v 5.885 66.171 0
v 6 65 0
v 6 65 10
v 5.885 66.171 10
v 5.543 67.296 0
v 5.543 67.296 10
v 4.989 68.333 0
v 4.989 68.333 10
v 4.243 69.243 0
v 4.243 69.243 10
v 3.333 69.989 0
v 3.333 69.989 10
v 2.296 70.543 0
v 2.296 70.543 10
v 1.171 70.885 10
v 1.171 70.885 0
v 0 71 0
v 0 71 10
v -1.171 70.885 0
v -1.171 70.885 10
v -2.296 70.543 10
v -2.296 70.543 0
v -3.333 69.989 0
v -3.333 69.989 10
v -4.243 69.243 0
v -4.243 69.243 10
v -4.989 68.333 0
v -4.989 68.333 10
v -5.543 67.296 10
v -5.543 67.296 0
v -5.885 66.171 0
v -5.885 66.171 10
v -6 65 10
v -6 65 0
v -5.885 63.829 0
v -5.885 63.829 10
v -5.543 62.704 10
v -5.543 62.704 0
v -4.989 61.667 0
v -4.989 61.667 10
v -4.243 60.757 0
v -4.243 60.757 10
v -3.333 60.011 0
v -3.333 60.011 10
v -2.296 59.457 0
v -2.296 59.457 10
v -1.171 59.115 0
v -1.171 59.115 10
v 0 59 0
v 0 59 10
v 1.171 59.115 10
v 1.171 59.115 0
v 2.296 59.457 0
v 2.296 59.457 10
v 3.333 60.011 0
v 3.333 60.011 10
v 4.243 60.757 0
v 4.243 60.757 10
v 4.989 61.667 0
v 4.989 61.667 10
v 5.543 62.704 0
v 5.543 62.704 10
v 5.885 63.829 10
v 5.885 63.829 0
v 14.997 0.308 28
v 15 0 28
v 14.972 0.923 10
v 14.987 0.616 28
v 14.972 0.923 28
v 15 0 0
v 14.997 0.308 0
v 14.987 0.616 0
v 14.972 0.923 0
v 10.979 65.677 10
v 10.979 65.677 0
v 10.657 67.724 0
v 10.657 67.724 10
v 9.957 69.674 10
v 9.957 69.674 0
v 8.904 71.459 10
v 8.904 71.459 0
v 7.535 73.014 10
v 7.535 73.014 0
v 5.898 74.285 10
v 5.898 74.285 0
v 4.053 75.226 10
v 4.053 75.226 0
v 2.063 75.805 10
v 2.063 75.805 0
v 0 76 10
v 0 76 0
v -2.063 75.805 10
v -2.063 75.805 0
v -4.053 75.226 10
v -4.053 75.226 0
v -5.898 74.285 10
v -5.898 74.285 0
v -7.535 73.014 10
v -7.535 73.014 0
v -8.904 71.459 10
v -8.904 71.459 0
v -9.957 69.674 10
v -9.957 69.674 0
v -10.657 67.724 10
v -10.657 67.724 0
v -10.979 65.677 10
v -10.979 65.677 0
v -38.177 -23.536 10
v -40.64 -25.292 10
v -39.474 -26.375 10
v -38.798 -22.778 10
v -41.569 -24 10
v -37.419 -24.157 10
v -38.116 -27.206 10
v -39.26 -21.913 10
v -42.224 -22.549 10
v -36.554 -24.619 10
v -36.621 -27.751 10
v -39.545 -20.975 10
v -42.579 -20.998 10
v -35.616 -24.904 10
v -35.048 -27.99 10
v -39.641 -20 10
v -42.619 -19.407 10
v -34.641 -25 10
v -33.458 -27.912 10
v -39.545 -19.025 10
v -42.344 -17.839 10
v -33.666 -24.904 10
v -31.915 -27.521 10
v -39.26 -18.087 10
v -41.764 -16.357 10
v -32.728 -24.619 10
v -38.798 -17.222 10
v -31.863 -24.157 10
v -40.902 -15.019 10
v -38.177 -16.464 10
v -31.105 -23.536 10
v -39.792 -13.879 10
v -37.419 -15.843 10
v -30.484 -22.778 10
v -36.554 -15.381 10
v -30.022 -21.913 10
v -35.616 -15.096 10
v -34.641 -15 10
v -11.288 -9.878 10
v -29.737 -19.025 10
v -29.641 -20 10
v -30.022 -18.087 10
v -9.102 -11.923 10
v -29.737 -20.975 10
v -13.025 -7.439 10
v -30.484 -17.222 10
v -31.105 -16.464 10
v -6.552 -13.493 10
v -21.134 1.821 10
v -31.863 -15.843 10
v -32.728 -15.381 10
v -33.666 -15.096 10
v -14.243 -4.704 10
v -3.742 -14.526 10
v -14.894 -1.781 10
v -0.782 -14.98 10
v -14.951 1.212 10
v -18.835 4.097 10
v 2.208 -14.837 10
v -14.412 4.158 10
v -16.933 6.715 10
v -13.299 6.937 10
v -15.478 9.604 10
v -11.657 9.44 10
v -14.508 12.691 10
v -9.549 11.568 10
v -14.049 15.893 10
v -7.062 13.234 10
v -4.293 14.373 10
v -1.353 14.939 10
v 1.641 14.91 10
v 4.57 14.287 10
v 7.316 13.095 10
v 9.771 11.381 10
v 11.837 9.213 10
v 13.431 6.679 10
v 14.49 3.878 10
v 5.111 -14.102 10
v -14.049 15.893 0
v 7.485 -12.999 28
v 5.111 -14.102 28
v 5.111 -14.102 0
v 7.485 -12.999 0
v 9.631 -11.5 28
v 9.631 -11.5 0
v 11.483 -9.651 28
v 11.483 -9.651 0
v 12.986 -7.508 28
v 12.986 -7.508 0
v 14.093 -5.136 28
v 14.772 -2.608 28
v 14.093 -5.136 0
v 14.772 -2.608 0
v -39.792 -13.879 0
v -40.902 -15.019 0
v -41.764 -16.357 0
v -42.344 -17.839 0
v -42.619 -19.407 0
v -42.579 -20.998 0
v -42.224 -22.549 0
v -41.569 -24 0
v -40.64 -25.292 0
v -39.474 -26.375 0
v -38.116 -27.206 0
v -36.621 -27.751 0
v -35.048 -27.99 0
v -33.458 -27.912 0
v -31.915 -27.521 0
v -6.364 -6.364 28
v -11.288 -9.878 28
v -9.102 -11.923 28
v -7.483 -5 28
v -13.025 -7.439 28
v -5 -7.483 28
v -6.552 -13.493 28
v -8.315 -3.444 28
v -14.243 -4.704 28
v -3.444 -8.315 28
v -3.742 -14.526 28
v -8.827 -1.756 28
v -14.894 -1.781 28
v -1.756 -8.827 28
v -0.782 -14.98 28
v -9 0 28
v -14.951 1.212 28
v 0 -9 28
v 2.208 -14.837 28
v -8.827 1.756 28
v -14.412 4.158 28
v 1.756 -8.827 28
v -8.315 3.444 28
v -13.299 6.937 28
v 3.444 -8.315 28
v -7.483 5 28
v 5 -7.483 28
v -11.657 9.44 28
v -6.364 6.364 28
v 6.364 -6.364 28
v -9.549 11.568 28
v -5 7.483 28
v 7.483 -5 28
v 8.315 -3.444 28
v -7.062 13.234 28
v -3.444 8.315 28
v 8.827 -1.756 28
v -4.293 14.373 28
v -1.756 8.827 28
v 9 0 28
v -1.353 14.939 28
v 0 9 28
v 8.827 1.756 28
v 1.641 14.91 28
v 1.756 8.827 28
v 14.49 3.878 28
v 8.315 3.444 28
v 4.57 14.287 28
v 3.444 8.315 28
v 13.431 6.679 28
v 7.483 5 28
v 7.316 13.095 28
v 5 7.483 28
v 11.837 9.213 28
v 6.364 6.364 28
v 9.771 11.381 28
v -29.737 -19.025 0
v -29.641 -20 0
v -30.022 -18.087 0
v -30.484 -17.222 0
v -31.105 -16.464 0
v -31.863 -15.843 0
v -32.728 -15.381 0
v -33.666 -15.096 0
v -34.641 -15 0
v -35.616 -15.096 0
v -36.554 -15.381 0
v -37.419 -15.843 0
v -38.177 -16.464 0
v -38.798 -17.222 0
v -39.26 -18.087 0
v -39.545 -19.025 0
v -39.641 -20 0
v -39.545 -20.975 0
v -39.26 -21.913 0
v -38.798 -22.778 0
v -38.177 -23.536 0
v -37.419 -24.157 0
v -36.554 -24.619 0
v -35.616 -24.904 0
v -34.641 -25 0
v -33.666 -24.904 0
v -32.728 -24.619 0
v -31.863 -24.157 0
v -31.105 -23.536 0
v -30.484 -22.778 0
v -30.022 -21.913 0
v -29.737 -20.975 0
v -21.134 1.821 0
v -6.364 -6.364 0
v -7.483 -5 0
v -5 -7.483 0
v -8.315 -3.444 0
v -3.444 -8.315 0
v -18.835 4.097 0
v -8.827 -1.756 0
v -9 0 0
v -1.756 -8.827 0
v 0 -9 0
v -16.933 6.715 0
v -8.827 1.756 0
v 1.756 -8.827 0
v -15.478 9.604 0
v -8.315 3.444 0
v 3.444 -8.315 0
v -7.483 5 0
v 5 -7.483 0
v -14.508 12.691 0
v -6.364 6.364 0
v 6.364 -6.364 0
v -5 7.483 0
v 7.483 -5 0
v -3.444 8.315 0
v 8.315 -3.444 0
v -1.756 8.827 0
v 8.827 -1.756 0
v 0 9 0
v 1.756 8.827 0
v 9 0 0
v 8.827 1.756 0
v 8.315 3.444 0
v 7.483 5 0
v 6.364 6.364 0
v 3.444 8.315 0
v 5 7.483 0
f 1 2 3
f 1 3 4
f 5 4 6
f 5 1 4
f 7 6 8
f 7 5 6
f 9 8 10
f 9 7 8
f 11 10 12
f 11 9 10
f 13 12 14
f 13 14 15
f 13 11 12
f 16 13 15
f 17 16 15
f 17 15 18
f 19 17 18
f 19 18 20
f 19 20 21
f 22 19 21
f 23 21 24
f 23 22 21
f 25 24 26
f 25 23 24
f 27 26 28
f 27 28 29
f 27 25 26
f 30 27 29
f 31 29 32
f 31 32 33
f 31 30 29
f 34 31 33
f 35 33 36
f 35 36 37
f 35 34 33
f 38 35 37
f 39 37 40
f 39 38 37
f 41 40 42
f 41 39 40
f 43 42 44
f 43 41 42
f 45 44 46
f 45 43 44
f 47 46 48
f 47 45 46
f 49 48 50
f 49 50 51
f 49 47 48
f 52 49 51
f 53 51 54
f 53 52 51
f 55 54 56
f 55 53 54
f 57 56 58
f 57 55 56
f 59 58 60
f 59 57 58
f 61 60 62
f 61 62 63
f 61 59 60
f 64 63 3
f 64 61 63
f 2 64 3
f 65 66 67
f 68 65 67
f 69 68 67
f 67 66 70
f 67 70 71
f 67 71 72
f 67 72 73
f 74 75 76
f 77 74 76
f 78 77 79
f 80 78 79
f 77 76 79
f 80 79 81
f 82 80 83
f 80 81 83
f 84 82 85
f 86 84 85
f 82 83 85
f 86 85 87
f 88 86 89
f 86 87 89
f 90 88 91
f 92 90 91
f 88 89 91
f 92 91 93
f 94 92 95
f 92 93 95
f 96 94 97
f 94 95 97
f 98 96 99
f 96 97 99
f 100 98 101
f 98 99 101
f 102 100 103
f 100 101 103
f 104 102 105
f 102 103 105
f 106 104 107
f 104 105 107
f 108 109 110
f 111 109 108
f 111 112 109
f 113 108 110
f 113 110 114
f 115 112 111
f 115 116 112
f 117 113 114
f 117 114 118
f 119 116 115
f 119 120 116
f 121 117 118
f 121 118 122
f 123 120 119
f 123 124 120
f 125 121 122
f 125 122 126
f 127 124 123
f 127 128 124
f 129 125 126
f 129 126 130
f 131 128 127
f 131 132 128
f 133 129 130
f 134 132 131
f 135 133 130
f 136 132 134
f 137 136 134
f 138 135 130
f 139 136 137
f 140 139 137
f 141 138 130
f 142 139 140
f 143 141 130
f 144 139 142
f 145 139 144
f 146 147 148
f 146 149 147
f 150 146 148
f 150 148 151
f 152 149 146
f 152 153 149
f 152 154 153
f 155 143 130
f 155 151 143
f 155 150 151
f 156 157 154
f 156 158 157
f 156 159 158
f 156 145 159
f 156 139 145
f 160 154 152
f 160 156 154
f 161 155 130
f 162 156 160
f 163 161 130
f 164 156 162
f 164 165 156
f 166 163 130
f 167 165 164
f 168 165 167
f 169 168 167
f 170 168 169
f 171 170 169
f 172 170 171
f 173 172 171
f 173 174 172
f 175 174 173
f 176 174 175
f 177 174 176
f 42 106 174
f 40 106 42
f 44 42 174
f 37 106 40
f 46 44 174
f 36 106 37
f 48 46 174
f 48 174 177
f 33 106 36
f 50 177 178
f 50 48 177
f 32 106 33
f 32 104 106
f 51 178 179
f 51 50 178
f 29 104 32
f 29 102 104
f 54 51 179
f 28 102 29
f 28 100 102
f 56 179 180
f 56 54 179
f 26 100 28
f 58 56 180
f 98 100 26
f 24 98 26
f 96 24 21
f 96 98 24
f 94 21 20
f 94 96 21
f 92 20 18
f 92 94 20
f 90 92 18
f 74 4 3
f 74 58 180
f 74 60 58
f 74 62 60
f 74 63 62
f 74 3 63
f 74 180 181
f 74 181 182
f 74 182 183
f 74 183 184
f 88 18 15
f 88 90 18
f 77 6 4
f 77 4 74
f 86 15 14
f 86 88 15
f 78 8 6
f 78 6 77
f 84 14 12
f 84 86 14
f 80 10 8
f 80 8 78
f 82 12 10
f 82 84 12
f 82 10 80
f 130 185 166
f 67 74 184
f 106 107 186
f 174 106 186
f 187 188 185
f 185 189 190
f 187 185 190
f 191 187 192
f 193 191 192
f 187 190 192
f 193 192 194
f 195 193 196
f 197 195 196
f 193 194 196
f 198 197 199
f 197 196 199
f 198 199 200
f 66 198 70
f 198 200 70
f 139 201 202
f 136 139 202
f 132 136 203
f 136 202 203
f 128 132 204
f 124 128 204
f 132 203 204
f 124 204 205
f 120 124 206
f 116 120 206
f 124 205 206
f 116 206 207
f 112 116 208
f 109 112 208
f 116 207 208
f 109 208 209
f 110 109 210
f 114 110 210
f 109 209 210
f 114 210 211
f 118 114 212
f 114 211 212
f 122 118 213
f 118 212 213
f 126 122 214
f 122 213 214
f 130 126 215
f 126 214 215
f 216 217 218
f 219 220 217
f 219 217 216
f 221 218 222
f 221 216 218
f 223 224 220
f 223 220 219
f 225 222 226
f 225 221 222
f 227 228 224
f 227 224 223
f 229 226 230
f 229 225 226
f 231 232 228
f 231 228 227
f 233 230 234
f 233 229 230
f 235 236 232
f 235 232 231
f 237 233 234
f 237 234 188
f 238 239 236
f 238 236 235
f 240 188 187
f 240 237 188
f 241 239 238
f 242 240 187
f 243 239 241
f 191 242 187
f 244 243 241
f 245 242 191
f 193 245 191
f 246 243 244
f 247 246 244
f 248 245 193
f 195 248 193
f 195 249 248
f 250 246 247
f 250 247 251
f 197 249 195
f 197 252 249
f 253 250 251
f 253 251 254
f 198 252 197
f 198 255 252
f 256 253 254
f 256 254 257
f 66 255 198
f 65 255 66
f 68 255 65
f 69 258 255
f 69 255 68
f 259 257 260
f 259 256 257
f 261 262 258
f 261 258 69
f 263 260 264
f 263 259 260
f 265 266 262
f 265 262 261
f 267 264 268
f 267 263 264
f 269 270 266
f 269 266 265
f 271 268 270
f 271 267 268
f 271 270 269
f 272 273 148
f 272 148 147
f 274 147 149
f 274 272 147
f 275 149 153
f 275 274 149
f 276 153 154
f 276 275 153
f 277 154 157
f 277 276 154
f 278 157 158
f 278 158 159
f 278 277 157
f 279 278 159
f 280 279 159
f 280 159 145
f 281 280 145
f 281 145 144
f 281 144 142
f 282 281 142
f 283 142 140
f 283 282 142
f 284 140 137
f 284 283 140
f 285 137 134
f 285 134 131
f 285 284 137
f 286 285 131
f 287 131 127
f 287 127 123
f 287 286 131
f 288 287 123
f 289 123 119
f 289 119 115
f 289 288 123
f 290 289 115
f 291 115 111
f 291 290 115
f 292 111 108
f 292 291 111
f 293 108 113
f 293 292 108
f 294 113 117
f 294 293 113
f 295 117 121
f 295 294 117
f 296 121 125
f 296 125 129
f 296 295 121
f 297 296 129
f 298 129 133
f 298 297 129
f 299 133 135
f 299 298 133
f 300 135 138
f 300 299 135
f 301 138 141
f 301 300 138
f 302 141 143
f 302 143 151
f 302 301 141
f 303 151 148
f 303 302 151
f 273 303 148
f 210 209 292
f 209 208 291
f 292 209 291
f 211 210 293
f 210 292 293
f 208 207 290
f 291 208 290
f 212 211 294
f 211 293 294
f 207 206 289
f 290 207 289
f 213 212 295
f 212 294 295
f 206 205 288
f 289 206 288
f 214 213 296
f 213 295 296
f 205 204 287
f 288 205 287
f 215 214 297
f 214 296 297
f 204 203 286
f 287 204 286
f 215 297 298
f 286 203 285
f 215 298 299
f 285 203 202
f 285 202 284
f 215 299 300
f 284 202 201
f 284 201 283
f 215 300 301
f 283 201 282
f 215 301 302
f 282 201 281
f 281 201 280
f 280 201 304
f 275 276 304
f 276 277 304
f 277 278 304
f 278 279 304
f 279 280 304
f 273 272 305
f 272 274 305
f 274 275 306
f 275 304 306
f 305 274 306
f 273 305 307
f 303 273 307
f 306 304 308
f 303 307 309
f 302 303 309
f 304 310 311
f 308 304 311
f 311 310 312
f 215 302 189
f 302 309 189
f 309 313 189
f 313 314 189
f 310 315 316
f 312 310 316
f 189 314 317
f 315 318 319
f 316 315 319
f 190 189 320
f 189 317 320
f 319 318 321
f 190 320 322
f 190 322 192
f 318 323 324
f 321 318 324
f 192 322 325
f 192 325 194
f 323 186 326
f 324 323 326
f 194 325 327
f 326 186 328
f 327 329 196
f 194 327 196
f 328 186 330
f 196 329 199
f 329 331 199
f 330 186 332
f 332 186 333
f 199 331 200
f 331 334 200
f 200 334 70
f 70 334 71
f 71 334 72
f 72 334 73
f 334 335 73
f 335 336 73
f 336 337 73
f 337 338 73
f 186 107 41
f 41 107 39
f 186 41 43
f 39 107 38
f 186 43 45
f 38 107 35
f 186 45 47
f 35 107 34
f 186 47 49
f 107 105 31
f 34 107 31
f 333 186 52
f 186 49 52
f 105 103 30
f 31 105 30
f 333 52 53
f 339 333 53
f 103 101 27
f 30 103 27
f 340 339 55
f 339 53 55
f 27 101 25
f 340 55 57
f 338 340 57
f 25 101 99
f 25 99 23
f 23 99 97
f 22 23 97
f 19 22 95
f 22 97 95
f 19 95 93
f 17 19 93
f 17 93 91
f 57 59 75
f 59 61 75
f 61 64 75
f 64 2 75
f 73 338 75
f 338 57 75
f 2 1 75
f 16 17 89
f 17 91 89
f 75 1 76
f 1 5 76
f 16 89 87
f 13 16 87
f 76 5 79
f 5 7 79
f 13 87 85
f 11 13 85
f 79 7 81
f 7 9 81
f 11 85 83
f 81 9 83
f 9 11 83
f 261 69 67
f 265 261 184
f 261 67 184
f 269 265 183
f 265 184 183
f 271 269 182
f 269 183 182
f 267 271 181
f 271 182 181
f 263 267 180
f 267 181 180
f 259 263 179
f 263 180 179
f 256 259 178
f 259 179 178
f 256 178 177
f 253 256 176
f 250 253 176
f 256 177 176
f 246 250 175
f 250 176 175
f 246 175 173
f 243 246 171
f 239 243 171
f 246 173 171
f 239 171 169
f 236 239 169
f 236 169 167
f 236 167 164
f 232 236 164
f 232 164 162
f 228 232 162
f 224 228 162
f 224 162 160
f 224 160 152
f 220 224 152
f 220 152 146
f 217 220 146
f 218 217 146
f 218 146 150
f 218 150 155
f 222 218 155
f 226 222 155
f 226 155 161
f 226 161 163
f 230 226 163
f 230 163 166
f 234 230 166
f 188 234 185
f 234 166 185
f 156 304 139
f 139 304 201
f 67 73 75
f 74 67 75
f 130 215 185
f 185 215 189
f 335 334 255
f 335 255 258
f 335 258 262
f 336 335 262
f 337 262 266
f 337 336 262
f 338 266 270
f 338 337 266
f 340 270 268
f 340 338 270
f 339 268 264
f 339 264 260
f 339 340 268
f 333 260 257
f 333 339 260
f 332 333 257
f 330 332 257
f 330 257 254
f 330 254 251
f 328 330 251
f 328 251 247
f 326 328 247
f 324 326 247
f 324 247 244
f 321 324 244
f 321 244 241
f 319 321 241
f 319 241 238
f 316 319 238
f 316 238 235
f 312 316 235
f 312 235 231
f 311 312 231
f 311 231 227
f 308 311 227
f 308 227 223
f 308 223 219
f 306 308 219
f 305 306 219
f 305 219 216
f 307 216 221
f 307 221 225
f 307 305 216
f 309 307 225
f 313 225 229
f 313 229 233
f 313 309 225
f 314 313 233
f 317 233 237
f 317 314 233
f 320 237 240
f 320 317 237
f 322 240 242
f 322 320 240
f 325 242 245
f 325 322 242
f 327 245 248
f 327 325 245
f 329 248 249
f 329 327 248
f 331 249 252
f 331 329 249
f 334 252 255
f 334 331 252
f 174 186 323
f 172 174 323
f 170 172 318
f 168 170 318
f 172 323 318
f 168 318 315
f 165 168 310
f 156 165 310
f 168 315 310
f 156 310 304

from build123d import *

# Parameters (mm, degrees)
F0_R     = 9
F1_DEPTH = 28
F0_R_2   = 5
F0_R_3   = 6
F2_DEPTH = 10


with BuildPart() as f1:
    # F0 (on Top) → F1 (new body)
    with BuildSketch(Plane.XY):
        with BuildLine():
            ThreePointArc((5.110947, -14.102419), (12.281372, -8.612079), (15, 0))
            ThreePointArc((15, 0), (14.992891, 0.461757), (14.971571, 0.923077))
            ThreePointArc((14.971571, 0.923077), (-12.540664, 8.22993), (5.110947, -14.102419))
        make_face()
        Circle(F0_R, mode=Mode.SUBTRACT)
    extrude(amount=F1_DEPTH)

    # F0 (on Top) → F2 (join)
    with BuildSketch(Plane.XY):
        with BuildLine():
            ThreePointArc((5.110947, -14.102419), (12.281372, -8.612079), (15, 0))
            ThreePointArc((15, 0), (14.992891, 0.461757), (14.971571, 0.923077))
            ThreePointArc((14.971571, 0.923077), (-12.540664, 8.22993), (5.110947, -14.102419))
        make_face()
        Circle(F0_R, mode=Mode.SUBTRACT)
        with BuildLine():
            ThreePointArc((5.110947, -14.102419), (-12.540664, 8.22993), (14.971571, 0.923077))
            Line((14.971571, 0.923077), (10.979152, 65.676923))
            ThreePointArc((10.979152, 65.676923), (0, 76), (-10.979152, 65.676923))
            Line((-10.979152, 65.676923), (-14.048582, 15.893218))
            ThreePointArc((-14.048582, 15.893218), (-16.147129, 8.129895), (-21.133903, 1.820762))
            Line((-21.133903, 1.820762), (-39.791725, -13.87871))
            ThreePointArc((-39.791725, -13.87871), (-41.569219, -24), (-31.915178, -27.52129))
            Line((-31.915178, -27.52129), (5.110947, -14.102419))
        make_face()
        with Locations((-34.641016, -20)):
            Circle(F0_R_2, mode=Mode.SUBTRACT)
        with Locations((0, 65)):
            Circle(F0_R_3, mode=Mode.SUBTRACT)
    extrude(amount=F2_DEPTH)


solid = f1.part
